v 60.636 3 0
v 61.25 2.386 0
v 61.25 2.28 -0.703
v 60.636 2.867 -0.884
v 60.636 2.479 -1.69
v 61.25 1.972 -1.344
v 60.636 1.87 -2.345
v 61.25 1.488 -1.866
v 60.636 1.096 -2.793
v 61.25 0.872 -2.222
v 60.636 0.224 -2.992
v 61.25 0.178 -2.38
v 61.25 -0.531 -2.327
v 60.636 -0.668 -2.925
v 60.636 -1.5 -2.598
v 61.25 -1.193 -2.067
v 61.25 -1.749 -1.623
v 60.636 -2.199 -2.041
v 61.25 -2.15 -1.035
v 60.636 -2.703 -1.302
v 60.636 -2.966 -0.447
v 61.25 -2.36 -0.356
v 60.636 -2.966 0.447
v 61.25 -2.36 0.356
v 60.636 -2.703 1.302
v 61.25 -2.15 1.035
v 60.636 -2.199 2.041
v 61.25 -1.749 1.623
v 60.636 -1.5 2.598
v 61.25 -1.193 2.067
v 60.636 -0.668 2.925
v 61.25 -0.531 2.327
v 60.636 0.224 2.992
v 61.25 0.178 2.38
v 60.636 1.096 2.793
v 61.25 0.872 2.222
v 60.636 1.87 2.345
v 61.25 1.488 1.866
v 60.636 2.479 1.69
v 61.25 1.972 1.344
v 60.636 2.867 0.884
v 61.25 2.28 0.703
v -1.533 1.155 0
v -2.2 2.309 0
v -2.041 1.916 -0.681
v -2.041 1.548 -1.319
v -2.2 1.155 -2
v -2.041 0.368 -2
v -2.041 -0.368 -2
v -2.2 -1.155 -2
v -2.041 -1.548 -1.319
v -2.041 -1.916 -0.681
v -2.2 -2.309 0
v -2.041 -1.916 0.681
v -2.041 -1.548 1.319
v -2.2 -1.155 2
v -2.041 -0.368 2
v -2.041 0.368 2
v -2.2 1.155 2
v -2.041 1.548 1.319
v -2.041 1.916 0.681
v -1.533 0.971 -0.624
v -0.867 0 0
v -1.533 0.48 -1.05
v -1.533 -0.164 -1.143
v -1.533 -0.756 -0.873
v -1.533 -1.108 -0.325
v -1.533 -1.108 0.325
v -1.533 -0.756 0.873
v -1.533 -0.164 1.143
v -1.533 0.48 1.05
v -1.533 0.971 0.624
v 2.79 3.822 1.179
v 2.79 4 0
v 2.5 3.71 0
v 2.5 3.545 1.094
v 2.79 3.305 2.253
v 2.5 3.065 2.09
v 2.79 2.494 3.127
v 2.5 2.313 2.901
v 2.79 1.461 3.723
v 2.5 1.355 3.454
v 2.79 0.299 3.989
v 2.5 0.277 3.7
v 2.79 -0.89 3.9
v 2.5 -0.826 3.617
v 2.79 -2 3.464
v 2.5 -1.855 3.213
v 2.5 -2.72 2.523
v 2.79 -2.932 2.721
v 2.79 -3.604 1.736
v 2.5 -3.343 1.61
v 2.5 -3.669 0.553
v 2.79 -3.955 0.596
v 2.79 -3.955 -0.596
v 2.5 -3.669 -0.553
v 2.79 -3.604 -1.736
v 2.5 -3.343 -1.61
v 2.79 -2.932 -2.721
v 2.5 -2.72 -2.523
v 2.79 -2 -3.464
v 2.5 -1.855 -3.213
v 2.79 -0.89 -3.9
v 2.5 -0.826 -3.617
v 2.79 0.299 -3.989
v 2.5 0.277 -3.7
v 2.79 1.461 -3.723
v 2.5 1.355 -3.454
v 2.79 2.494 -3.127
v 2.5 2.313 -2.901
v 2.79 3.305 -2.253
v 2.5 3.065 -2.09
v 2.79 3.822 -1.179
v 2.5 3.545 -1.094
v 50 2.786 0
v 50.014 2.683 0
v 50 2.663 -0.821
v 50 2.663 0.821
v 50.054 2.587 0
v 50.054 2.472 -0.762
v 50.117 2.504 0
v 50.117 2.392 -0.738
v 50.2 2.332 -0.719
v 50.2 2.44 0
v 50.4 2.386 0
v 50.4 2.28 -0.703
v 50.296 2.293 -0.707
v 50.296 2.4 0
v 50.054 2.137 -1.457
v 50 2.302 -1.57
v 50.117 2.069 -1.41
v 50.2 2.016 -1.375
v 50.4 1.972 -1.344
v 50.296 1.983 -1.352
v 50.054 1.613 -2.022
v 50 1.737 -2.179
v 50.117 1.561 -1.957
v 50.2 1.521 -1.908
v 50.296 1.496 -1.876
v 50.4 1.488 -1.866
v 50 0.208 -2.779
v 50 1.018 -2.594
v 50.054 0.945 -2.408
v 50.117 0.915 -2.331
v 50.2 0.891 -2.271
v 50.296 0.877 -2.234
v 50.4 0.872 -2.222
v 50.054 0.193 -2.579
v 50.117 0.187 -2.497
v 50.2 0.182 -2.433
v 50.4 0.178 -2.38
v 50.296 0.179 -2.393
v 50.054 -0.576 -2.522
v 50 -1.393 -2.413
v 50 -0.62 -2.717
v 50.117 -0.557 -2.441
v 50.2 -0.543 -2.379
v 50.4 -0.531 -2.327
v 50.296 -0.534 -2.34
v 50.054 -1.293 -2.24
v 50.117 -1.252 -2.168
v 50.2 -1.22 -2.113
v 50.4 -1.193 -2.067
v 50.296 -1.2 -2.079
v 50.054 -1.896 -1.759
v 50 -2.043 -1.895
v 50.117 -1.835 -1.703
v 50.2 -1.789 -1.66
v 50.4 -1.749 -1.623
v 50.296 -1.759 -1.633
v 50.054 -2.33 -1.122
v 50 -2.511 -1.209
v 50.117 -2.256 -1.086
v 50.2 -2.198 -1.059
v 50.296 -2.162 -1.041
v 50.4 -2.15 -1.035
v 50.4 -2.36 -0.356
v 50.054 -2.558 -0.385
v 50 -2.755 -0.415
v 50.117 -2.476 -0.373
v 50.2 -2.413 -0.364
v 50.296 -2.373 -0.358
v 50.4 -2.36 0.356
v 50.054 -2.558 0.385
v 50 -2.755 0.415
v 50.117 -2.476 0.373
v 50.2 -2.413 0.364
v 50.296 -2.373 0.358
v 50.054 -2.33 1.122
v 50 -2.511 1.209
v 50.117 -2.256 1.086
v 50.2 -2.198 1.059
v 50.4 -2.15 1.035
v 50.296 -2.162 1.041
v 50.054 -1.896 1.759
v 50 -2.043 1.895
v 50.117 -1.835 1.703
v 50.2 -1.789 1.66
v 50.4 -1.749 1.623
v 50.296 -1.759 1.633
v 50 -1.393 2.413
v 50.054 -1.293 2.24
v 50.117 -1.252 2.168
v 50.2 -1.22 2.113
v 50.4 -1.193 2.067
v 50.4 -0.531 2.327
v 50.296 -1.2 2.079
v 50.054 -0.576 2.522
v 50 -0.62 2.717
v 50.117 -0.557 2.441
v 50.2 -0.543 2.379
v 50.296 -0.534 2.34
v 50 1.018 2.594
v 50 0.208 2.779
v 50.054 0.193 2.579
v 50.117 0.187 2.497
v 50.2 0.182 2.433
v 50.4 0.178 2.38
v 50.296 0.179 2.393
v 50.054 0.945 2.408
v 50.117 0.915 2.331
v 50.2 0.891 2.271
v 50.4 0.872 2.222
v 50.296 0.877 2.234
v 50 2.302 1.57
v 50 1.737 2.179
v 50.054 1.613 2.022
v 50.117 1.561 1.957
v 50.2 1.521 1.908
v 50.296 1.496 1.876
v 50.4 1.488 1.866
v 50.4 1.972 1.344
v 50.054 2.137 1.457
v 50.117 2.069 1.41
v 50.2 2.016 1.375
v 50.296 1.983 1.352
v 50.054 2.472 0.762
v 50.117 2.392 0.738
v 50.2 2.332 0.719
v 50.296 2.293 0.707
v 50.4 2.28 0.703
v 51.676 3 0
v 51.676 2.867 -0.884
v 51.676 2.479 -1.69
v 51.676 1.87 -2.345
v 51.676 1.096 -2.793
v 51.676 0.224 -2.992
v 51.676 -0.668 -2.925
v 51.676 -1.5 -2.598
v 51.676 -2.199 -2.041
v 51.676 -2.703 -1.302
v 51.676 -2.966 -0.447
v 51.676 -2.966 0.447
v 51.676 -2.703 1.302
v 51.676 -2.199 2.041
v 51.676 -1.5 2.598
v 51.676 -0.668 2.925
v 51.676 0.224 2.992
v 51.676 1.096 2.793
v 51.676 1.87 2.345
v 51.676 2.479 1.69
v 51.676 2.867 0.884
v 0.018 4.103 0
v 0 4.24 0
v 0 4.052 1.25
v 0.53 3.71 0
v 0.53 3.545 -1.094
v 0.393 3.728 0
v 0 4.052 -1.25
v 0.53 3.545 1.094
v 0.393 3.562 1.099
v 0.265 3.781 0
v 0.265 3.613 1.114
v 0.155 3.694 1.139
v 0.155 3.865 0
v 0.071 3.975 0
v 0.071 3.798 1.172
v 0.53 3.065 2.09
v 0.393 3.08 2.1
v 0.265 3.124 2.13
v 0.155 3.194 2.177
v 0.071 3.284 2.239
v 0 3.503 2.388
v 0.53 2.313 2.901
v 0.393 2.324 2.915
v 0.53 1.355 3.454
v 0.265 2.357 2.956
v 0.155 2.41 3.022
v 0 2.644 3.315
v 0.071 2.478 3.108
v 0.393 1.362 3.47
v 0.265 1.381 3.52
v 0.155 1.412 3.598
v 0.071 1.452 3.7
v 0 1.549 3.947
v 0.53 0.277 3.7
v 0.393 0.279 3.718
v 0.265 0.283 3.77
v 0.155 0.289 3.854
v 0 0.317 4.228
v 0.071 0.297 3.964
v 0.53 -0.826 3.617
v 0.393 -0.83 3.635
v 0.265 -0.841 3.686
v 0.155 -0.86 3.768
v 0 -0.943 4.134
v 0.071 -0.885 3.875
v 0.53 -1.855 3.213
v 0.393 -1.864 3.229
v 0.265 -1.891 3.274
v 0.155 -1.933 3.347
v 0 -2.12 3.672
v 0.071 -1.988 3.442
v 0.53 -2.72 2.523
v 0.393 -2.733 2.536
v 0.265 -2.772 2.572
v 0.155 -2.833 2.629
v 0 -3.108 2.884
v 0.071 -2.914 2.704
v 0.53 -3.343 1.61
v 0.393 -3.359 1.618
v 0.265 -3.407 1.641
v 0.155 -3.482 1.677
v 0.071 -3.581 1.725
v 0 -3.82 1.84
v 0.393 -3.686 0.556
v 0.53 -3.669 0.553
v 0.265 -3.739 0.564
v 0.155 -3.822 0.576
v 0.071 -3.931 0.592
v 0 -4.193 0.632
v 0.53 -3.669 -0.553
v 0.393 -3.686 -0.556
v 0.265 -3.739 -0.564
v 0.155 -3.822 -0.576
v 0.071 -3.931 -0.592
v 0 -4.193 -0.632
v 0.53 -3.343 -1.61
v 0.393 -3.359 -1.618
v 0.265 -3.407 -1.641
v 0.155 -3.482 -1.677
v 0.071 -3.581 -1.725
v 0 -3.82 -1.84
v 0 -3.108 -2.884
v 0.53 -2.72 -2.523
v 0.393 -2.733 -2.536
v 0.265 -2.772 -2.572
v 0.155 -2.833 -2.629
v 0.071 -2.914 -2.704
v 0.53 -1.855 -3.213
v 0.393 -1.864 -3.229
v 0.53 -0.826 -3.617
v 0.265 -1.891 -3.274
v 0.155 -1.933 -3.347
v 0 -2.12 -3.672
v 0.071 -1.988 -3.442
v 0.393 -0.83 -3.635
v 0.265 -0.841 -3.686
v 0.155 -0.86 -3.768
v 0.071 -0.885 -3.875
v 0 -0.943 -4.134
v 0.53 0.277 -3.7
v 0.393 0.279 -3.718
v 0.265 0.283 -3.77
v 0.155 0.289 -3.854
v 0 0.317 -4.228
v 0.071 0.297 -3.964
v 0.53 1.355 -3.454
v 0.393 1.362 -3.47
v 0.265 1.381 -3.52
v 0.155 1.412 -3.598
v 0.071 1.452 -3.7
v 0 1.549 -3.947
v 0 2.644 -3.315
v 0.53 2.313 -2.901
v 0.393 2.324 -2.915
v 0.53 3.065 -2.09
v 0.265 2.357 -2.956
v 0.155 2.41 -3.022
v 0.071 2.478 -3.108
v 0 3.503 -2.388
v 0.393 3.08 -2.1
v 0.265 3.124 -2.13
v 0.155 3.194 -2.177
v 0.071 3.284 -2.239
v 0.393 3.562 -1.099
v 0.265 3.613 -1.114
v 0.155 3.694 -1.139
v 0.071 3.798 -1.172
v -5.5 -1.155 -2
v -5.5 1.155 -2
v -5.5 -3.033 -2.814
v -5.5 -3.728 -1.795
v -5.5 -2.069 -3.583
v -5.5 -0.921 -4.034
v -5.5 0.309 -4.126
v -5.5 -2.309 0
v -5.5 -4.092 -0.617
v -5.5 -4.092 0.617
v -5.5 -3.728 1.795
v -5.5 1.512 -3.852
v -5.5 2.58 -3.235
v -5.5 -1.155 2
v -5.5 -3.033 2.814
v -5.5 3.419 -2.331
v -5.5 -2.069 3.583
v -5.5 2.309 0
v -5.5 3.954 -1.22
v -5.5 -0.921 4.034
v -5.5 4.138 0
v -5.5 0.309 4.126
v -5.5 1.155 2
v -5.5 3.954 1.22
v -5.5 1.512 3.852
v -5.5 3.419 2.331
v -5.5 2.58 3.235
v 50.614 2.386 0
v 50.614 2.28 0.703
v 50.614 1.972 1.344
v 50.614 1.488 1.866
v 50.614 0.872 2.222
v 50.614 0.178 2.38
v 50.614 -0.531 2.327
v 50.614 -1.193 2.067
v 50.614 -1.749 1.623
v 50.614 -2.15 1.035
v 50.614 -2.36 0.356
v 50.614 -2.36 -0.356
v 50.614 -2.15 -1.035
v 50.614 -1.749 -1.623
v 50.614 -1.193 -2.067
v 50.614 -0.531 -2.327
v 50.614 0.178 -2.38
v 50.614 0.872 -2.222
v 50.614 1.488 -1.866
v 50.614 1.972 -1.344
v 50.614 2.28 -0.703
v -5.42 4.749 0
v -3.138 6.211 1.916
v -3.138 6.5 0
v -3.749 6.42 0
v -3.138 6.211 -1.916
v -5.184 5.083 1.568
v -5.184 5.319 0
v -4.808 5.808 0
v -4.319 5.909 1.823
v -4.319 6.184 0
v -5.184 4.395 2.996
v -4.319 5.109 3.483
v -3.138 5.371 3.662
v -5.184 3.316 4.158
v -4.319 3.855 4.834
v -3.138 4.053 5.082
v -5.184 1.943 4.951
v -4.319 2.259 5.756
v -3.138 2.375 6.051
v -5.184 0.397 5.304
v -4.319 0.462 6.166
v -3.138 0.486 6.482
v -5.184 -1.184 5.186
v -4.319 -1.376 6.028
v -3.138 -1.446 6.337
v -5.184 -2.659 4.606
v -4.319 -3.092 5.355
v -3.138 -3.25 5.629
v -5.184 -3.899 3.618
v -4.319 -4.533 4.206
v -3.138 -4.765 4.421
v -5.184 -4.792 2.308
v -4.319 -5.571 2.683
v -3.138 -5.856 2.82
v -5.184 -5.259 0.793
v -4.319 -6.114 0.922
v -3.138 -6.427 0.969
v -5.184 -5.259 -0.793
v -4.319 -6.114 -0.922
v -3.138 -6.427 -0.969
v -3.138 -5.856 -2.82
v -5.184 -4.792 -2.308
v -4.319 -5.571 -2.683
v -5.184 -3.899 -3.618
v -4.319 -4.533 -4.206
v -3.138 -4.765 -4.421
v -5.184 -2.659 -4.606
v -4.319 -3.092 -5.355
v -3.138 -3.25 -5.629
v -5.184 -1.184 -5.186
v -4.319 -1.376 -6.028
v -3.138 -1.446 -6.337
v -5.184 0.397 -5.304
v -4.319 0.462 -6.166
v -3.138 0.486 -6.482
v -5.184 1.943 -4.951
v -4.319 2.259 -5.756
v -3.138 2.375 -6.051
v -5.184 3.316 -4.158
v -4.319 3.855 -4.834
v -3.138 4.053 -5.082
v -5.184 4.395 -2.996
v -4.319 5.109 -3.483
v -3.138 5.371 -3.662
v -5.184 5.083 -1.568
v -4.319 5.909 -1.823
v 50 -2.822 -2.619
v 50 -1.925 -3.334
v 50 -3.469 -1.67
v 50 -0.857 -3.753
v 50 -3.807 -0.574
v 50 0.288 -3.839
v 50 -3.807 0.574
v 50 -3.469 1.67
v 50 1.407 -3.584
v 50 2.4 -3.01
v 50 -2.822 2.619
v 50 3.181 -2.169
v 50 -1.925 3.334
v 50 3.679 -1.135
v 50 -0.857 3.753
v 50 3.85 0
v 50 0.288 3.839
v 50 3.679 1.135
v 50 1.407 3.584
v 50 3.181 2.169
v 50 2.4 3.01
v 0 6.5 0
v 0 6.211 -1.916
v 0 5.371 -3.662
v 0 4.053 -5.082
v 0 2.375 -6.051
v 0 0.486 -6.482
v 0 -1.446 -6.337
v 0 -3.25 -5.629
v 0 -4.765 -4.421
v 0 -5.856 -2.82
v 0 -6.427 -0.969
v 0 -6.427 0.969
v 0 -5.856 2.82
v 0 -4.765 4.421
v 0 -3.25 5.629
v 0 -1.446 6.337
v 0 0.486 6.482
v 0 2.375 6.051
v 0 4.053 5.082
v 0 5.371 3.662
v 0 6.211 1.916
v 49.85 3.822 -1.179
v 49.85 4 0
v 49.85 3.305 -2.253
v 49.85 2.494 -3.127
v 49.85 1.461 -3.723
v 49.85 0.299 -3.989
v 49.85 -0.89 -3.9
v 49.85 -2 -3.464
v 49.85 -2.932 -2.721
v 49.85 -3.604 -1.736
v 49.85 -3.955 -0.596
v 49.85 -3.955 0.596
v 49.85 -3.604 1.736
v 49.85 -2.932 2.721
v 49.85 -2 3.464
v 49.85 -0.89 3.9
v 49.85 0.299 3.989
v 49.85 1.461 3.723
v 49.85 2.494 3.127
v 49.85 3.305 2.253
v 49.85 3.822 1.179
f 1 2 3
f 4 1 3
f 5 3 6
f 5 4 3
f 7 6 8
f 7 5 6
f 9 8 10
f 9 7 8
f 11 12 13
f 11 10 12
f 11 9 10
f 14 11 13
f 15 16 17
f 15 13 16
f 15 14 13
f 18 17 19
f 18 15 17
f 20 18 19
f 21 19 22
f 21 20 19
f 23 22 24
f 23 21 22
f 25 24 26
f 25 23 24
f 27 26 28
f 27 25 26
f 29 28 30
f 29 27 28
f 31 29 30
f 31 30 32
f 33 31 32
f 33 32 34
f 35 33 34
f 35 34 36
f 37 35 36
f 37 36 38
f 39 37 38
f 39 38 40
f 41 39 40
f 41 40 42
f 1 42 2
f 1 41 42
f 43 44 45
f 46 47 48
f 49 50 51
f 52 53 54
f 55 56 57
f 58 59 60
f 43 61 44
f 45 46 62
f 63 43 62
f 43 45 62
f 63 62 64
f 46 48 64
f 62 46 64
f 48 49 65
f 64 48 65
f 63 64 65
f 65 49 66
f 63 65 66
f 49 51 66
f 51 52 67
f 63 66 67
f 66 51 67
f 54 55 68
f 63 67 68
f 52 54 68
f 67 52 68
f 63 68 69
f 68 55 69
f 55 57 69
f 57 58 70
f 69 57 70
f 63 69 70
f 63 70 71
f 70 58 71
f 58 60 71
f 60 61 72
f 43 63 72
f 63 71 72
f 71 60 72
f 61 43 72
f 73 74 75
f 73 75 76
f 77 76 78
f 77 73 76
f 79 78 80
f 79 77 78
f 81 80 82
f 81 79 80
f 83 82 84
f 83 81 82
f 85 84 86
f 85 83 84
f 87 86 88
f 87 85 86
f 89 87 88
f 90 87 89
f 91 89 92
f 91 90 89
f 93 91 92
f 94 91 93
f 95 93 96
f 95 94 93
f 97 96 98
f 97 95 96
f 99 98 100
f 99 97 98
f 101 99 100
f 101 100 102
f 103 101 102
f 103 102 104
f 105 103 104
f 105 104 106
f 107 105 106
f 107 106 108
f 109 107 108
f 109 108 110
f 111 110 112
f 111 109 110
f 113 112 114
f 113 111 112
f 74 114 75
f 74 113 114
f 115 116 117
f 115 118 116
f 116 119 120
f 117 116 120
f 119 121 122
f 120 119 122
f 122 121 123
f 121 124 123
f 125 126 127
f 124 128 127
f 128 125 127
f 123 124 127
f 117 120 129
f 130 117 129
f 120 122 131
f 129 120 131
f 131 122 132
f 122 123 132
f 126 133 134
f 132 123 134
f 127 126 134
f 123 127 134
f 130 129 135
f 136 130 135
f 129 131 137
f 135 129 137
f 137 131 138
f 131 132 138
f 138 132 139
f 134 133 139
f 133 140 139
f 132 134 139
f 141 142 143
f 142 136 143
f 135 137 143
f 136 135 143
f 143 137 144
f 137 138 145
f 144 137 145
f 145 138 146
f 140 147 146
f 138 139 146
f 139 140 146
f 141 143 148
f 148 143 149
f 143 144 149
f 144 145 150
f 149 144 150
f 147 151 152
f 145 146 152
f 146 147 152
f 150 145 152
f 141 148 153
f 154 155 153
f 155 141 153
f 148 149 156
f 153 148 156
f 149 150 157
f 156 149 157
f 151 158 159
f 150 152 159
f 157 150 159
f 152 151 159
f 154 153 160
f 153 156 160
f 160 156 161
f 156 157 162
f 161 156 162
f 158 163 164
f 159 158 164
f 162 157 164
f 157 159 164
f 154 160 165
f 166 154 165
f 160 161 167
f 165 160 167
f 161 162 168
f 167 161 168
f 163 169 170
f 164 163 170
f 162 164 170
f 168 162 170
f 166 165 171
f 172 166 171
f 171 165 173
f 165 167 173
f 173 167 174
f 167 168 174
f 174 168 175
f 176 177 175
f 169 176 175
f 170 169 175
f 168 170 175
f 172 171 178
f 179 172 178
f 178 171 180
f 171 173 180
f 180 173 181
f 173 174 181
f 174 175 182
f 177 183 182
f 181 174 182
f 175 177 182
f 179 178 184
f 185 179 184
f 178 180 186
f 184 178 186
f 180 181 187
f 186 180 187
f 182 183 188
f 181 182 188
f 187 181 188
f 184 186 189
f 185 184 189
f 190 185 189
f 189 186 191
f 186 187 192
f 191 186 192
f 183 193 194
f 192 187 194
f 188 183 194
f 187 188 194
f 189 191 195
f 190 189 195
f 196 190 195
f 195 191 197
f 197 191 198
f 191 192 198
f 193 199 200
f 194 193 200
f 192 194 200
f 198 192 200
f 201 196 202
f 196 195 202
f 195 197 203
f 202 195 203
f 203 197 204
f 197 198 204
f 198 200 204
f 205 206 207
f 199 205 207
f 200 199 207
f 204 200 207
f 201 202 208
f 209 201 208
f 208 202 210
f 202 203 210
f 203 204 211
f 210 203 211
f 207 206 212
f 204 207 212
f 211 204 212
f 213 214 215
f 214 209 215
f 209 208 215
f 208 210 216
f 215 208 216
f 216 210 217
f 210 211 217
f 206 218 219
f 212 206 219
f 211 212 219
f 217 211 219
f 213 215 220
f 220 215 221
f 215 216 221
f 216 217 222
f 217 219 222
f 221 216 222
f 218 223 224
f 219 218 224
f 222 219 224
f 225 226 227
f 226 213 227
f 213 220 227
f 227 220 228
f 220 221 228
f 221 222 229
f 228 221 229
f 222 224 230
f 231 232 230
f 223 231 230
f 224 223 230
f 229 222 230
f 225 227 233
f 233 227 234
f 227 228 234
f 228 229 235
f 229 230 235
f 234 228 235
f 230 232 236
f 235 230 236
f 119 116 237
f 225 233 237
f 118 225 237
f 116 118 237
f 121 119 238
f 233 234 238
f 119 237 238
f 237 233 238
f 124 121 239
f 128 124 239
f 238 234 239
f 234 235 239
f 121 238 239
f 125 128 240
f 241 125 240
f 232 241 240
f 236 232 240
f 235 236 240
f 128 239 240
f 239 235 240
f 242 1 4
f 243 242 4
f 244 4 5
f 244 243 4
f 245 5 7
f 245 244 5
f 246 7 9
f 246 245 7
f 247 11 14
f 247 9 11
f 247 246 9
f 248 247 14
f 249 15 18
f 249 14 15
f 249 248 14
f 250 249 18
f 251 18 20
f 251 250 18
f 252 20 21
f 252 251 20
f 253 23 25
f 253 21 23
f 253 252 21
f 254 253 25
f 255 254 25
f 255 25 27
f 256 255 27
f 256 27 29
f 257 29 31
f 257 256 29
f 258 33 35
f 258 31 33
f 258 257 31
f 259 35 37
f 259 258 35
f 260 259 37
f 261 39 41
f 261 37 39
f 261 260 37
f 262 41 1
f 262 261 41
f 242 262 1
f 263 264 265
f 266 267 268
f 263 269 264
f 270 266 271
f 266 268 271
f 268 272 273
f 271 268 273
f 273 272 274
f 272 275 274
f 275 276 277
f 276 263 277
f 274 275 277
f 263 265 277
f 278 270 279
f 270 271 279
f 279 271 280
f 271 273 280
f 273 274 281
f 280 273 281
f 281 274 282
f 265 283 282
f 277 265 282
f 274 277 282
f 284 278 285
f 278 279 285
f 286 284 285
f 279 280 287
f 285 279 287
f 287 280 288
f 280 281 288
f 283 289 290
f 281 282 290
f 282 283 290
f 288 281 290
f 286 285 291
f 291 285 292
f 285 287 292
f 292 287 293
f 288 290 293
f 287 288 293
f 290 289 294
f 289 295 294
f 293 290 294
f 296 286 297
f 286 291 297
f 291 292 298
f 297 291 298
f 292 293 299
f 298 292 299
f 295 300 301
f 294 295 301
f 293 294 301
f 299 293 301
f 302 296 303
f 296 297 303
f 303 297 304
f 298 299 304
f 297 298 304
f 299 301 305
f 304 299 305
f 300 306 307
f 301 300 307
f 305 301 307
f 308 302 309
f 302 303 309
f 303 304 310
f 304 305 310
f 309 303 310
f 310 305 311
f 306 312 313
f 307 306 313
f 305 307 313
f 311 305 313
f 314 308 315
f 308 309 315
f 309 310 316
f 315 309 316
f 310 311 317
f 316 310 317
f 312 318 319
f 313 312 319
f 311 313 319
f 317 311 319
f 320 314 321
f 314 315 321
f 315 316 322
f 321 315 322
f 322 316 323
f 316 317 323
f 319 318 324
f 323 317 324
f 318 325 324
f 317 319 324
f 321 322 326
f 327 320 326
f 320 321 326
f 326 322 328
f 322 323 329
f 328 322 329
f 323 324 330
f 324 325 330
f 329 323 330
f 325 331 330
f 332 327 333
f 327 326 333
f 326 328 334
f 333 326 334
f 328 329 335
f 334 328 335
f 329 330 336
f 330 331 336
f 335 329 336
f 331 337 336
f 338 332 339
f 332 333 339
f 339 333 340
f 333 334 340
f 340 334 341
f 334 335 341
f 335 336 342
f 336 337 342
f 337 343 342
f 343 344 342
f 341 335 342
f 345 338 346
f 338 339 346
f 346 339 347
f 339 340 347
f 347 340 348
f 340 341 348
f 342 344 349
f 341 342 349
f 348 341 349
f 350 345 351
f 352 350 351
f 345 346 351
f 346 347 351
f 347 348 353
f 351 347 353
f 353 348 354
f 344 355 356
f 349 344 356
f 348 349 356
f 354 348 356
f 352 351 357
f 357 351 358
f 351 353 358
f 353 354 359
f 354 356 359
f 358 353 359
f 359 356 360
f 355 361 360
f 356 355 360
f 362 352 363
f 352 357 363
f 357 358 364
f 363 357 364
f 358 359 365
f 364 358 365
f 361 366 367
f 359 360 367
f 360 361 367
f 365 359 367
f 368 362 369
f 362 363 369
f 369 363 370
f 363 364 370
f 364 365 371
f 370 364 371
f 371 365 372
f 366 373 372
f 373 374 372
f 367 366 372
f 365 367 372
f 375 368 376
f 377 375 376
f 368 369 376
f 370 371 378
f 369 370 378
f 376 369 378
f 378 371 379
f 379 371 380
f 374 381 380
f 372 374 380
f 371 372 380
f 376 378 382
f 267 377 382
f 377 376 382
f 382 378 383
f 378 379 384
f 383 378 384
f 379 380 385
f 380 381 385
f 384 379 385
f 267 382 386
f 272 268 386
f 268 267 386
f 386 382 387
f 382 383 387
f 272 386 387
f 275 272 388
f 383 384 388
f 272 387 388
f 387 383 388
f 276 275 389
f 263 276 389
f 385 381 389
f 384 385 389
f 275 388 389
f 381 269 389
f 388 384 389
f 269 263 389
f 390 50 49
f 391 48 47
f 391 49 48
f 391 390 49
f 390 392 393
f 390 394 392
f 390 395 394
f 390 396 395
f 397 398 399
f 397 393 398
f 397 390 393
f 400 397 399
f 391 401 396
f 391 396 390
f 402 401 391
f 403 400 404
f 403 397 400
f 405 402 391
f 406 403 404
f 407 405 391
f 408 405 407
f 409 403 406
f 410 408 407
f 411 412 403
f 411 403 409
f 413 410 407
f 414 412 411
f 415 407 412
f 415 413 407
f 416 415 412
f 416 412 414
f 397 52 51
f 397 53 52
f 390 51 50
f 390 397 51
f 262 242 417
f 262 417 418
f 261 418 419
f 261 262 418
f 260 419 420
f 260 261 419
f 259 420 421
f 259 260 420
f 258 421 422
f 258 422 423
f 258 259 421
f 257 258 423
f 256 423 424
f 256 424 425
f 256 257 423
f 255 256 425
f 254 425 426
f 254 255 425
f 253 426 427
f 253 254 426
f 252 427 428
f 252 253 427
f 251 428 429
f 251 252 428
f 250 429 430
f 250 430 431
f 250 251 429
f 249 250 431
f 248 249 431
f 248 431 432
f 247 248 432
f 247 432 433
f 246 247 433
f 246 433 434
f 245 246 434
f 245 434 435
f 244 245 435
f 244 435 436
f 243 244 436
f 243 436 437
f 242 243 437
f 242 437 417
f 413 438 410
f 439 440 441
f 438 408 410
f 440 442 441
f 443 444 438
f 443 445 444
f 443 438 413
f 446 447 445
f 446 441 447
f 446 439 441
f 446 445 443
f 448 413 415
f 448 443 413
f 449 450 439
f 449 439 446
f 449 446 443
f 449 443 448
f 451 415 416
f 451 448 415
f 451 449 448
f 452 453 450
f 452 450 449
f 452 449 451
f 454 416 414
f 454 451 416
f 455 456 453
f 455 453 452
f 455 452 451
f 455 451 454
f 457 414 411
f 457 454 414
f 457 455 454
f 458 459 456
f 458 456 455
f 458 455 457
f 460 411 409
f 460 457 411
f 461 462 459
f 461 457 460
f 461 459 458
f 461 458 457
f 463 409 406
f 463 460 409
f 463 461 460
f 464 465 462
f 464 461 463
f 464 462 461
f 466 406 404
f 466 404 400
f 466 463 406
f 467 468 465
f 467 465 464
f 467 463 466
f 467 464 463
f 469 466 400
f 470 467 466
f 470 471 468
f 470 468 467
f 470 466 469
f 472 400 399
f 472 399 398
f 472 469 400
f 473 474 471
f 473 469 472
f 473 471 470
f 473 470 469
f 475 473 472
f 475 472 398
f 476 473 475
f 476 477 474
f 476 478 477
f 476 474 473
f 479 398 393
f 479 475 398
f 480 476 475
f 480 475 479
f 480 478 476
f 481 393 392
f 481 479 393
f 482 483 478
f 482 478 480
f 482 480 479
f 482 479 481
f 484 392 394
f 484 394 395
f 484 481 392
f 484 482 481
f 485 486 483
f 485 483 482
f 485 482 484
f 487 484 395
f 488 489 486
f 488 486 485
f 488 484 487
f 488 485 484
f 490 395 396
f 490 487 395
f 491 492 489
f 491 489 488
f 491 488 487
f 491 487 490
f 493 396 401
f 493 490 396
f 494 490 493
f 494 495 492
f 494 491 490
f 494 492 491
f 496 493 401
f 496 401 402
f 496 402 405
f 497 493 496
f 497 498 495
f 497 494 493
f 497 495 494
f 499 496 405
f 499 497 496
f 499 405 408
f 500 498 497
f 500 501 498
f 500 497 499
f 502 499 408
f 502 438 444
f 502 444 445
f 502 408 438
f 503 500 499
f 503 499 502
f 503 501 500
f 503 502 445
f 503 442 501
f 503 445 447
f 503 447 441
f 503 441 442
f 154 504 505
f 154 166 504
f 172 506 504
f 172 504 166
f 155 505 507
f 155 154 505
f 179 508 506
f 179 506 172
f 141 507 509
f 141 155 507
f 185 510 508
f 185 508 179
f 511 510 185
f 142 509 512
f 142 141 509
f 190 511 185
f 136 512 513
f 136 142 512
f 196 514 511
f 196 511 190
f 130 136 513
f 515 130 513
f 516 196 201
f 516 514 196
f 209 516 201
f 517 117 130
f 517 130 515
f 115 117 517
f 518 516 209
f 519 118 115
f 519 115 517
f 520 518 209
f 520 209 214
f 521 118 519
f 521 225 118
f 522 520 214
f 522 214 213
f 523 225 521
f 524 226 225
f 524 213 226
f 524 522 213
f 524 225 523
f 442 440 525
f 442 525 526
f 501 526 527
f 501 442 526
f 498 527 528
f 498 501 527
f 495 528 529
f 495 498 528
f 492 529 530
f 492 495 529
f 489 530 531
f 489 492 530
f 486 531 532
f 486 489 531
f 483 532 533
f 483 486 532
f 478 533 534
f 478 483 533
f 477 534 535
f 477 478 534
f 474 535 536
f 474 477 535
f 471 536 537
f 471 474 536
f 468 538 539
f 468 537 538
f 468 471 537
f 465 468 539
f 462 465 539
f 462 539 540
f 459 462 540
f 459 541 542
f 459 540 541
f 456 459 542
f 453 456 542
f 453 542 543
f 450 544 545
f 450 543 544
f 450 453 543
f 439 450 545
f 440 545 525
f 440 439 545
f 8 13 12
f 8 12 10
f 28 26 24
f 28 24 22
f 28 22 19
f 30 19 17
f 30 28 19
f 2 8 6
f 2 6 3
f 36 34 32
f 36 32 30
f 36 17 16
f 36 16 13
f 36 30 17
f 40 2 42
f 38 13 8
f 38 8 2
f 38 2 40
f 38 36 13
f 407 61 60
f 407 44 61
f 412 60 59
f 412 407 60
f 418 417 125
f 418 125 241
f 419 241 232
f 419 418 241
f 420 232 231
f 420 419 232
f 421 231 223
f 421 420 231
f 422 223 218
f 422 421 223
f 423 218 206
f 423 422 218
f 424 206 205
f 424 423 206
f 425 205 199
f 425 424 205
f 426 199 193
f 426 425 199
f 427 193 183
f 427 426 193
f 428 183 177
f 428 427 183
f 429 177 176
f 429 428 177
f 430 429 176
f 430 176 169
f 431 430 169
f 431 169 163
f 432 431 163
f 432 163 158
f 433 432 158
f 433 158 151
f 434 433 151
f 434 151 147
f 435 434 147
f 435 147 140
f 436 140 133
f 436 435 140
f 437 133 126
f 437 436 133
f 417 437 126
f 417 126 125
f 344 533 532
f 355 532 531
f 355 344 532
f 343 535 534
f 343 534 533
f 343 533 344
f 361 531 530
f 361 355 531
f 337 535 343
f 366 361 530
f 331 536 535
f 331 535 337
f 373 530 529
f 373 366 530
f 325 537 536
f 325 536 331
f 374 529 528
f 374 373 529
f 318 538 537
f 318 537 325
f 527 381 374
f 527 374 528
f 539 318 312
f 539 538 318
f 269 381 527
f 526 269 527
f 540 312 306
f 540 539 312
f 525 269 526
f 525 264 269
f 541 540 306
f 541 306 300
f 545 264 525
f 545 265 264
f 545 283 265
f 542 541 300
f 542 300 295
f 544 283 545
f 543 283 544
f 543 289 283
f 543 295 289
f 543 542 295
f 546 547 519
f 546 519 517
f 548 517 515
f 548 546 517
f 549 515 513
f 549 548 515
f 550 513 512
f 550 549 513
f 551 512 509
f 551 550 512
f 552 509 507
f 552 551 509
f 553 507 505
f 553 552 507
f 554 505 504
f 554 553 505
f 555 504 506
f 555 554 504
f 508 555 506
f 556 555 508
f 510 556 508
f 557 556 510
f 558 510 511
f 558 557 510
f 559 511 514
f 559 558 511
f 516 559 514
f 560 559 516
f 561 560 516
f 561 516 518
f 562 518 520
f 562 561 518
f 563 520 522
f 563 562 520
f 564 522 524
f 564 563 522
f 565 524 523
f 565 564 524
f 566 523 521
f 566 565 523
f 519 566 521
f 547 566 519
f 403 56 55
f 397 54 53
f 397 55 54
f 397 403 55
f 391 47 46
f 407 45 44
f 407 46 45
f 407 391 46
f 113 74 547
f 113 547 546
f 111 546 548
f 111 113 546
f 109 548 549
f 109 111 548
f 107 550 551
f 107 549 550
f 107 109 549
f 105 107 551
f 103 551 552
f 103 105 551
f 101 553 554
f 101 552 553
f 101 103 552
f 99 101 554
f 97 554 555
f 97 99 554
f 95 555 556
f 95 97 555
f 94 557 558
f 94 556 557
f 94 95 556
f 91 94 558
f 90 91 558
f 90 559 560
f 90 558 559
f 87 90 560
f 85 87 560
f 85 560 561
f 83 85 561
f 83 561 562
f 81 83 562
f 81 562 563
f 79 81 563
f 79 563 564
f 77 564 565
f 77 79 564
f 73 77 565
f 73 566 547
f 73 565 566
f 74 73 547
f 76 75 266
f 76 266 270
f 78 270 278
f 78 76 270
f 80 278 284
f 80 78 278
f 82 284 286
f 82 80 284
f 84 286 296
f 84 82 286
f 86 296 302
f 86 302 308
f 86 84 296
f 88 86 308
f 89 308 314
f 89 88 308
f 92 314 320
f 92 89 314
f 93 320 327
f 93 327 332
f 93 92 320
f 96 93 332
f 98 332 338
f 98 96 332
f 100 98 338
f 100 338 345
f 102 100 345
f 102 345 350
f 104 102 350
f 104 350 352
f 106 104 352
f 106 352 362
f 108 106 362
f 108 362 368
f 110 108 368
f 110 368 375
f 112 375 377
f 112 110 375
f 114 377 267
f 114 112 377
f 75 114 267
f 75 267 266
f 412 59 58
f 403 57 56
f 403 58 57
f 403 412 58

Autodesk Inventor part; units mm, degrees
ref_plane "YZ Plane" through (0, 0, 0) normal (1, 0, 0) x (0, 1, 0)
ref_plane "XZ Plane" through (0, 0, 0) normal (0, 1, 0) x (-1, 0, 0)
sketch "Sketch1" plane through (0, 0, 0) normal (0, 0, 1) x (1, 0, 0)
  line L0 (-0.8667, 0) -> (61.25, 0)
  line L1 (61.25, 0) -> (61.25, 3)
  line L2 (61.25, 3) -> (50, 3)
  line L3 (50, 3) -> (50, 4)
  line L4 (50, 4) -> (0, 4)
  line L5 (0, 4) -> (0, 6.5)
  line L6 (0, 6.5) -> (-5.5, 6.5)
  line L7 (-5.5, 6.5) -> (-5.5, 2.3094)
  line L8 (-5.5, 2.3094) -> (-2.2, 2.3094)
  line L9 (-2.2, 2.3094) -> (-0.8667, 0)
  line L10 (-18.85, 0) -> (74.6, 0) projected
  line L11 (0, -1.3) -> (0, 7.8) projected
  line L12 (0, 3.71) -> (2.5, 3.71)
  line L13 (2.5, 3.71) -> (2.79, 4)
  line L14 (50, 3) -> (50, 2.3865)
  line L15 (50, 2.3865) -> (50.6135, 2.3865)
  line L16 (50.6135, 2.3865) -> (51.676, 3)
  line L17 (0, 3.71) -> (0, 4)
  dimension "d0" = 6
  dimension "d1" = 8
  dimension "d2" = 13
  dimension "d3" = 4.6188
  dimension "d5" = 11.25
  dimension "d6" = 5.5
  dimension "d7" = 3.3
  dimension "d8" = 60
  dimension "d9" = 61.25
  dimension "d18" = 2.5
  dimension "d19" = 45
  dimension "d20" = 7.42
  dimension "d21" = 4.7731
  dimension "d22" = 30
  dimension "d23" = 0.6135
revolve "Body" add sketch "Sketch1" angle 360 about axis through (-0.8667, 0, 0) along (1, 0, 0)
sketch "Sketch2" plane through (-5.5, 0, 0) normal (-1, 0, 0) x (0, 0, 1)
  circle A0 centre (0, 0) radius 2.3094 projected
  line L0 (0, 2.3094) -> (2, 1.1547)
  line L1 (2, 1.1547) -> (2, -1.1547)
  line L2 (2, -1.1547) -> (0, -2.3094)
  line L3 (0, -2.3094) -> (-2, -1.1547)
  line L4 (-2, -1.1547) -> (-2, 1.1547)
  line L5 (-2, 1.1547) -> (0, 2.3094)
extrude "Slot" add sketch "Sketch2" against normal up to next contours A0 L1 | L0 A0 | A0 L2 | L5 A0 | A0 L3 | L4 A0
fillet "Fillet1" radius 2.3622 1 edges at (-5.5, -6.5, 0)
thread "Thread" size "M6x1" class "6g" standard "ISO Metric profile" full length
chamfer "Chamfer1" distance 0.6135 distance2 0.6135 1 edges at (61.25, -3, 0) measured on face at (61.25, 0.2734, 0.7208)
chamfer "Chamfer2" distance 0.15 angle 45 1 edges at (50, -4, 0)
revolve "Groove1" cut sketch "Sketch1" angle 360 about axis through (-0.8667, 0, 0) along (1, 0, 0) contours L11 L4 L13 L12
revolve "Groove2" cut sketch "Sketch1" angle 360 about axis through (-0.8667, 0, 0) along (1, 0, 0) contours L16 L15 L14 L2
ref_plane "Work Plane1" through (25, 0, 0) normal (0, 0, 1) x (1, 0, 0)
fillet "Fillet2" radius 0.4 1 edges at (50, -2.3865, 0)
fillet "Fillet3" radius 0.53 1 edges at (0, -3.71, 0)
equation "\"d0\" = NND"
equation "\"d1\" = BDM"
equation "\"d2\" = KOD"
equation "\"d3\" = 1.1547 * SW"
equation "\"d5\" = GEL"
equation "\"d6\" = KOH"
equation "\"d7\" = INTI + LOTI"
equation "\"d8\" = 0.5 * ANG"
equation "\"d9\" = NLG"
equation "\"d18\" = GAL2"
equation "\"d19\" = FAWI4"
equation "\"d20\" = BDMM"
equation "\"d21\" = GD1"
equation "\"d22\" = FAWI2"
equation "\"d23\" = GAL"
equation "\"d13\" = RR"
equation "\"d25\" = GEL"
equation "\"d14\" = -0.5 * SPD + 0.5 * NND"
equation "\"d15\" = GUL"
equation "\"d16\" = D1"
equation "\"d35\" = R1"
equation "\"d36\" = R2"
equation "\"NND\" = 6"
equation "\"NLG\" = 61.25"
equation "\"GEL\" = 11.25"
equation "\"KOD\" = 13"
equation "\"KOH\" = 5.5"
equation "\"INTI\" = 3.3"
equation "\"GAL\" = 0.61345 * PTC"
equation "\"GUL\" = 0.61345 * PTC"
equation "\"SPD\" = NND - 1.2269 * PTC"
equation "\"BDM\" = 8"
equation "\"ANG\" = 120deg"
equation "\"FAWI2\" = 30deg"
equation "\"FAWI3\" = 89deg"
equation "\"FAWI4\" = 45deg"
equation "\"RR\" = 2.3622"
equation "\"SW\" = 4"
equation "\"BDMM\" = 7.42"
equation "\"GAL2\" = 2.5"
equation "\"LOTI\" = 0"
equation "\"GD1\" = THREADDIA - 1.2269 * PTC"
equation "\"D1\" = 0.15"
equation "\"R1\" = 0.4"
equation "\"R2\" = 0.53"
equation "\"PTC\" = 1"
equation "\"BOR\" = 4"
equation "\"THREADDIA\" = 6"
equation "\"E0\" = 1.155 * SW"
equation "\"TOA\" = 30deg"
equation "\"PHH\" = 0.55"
properties part number "ISO  7379 - 8 x 50" material "Steel"
